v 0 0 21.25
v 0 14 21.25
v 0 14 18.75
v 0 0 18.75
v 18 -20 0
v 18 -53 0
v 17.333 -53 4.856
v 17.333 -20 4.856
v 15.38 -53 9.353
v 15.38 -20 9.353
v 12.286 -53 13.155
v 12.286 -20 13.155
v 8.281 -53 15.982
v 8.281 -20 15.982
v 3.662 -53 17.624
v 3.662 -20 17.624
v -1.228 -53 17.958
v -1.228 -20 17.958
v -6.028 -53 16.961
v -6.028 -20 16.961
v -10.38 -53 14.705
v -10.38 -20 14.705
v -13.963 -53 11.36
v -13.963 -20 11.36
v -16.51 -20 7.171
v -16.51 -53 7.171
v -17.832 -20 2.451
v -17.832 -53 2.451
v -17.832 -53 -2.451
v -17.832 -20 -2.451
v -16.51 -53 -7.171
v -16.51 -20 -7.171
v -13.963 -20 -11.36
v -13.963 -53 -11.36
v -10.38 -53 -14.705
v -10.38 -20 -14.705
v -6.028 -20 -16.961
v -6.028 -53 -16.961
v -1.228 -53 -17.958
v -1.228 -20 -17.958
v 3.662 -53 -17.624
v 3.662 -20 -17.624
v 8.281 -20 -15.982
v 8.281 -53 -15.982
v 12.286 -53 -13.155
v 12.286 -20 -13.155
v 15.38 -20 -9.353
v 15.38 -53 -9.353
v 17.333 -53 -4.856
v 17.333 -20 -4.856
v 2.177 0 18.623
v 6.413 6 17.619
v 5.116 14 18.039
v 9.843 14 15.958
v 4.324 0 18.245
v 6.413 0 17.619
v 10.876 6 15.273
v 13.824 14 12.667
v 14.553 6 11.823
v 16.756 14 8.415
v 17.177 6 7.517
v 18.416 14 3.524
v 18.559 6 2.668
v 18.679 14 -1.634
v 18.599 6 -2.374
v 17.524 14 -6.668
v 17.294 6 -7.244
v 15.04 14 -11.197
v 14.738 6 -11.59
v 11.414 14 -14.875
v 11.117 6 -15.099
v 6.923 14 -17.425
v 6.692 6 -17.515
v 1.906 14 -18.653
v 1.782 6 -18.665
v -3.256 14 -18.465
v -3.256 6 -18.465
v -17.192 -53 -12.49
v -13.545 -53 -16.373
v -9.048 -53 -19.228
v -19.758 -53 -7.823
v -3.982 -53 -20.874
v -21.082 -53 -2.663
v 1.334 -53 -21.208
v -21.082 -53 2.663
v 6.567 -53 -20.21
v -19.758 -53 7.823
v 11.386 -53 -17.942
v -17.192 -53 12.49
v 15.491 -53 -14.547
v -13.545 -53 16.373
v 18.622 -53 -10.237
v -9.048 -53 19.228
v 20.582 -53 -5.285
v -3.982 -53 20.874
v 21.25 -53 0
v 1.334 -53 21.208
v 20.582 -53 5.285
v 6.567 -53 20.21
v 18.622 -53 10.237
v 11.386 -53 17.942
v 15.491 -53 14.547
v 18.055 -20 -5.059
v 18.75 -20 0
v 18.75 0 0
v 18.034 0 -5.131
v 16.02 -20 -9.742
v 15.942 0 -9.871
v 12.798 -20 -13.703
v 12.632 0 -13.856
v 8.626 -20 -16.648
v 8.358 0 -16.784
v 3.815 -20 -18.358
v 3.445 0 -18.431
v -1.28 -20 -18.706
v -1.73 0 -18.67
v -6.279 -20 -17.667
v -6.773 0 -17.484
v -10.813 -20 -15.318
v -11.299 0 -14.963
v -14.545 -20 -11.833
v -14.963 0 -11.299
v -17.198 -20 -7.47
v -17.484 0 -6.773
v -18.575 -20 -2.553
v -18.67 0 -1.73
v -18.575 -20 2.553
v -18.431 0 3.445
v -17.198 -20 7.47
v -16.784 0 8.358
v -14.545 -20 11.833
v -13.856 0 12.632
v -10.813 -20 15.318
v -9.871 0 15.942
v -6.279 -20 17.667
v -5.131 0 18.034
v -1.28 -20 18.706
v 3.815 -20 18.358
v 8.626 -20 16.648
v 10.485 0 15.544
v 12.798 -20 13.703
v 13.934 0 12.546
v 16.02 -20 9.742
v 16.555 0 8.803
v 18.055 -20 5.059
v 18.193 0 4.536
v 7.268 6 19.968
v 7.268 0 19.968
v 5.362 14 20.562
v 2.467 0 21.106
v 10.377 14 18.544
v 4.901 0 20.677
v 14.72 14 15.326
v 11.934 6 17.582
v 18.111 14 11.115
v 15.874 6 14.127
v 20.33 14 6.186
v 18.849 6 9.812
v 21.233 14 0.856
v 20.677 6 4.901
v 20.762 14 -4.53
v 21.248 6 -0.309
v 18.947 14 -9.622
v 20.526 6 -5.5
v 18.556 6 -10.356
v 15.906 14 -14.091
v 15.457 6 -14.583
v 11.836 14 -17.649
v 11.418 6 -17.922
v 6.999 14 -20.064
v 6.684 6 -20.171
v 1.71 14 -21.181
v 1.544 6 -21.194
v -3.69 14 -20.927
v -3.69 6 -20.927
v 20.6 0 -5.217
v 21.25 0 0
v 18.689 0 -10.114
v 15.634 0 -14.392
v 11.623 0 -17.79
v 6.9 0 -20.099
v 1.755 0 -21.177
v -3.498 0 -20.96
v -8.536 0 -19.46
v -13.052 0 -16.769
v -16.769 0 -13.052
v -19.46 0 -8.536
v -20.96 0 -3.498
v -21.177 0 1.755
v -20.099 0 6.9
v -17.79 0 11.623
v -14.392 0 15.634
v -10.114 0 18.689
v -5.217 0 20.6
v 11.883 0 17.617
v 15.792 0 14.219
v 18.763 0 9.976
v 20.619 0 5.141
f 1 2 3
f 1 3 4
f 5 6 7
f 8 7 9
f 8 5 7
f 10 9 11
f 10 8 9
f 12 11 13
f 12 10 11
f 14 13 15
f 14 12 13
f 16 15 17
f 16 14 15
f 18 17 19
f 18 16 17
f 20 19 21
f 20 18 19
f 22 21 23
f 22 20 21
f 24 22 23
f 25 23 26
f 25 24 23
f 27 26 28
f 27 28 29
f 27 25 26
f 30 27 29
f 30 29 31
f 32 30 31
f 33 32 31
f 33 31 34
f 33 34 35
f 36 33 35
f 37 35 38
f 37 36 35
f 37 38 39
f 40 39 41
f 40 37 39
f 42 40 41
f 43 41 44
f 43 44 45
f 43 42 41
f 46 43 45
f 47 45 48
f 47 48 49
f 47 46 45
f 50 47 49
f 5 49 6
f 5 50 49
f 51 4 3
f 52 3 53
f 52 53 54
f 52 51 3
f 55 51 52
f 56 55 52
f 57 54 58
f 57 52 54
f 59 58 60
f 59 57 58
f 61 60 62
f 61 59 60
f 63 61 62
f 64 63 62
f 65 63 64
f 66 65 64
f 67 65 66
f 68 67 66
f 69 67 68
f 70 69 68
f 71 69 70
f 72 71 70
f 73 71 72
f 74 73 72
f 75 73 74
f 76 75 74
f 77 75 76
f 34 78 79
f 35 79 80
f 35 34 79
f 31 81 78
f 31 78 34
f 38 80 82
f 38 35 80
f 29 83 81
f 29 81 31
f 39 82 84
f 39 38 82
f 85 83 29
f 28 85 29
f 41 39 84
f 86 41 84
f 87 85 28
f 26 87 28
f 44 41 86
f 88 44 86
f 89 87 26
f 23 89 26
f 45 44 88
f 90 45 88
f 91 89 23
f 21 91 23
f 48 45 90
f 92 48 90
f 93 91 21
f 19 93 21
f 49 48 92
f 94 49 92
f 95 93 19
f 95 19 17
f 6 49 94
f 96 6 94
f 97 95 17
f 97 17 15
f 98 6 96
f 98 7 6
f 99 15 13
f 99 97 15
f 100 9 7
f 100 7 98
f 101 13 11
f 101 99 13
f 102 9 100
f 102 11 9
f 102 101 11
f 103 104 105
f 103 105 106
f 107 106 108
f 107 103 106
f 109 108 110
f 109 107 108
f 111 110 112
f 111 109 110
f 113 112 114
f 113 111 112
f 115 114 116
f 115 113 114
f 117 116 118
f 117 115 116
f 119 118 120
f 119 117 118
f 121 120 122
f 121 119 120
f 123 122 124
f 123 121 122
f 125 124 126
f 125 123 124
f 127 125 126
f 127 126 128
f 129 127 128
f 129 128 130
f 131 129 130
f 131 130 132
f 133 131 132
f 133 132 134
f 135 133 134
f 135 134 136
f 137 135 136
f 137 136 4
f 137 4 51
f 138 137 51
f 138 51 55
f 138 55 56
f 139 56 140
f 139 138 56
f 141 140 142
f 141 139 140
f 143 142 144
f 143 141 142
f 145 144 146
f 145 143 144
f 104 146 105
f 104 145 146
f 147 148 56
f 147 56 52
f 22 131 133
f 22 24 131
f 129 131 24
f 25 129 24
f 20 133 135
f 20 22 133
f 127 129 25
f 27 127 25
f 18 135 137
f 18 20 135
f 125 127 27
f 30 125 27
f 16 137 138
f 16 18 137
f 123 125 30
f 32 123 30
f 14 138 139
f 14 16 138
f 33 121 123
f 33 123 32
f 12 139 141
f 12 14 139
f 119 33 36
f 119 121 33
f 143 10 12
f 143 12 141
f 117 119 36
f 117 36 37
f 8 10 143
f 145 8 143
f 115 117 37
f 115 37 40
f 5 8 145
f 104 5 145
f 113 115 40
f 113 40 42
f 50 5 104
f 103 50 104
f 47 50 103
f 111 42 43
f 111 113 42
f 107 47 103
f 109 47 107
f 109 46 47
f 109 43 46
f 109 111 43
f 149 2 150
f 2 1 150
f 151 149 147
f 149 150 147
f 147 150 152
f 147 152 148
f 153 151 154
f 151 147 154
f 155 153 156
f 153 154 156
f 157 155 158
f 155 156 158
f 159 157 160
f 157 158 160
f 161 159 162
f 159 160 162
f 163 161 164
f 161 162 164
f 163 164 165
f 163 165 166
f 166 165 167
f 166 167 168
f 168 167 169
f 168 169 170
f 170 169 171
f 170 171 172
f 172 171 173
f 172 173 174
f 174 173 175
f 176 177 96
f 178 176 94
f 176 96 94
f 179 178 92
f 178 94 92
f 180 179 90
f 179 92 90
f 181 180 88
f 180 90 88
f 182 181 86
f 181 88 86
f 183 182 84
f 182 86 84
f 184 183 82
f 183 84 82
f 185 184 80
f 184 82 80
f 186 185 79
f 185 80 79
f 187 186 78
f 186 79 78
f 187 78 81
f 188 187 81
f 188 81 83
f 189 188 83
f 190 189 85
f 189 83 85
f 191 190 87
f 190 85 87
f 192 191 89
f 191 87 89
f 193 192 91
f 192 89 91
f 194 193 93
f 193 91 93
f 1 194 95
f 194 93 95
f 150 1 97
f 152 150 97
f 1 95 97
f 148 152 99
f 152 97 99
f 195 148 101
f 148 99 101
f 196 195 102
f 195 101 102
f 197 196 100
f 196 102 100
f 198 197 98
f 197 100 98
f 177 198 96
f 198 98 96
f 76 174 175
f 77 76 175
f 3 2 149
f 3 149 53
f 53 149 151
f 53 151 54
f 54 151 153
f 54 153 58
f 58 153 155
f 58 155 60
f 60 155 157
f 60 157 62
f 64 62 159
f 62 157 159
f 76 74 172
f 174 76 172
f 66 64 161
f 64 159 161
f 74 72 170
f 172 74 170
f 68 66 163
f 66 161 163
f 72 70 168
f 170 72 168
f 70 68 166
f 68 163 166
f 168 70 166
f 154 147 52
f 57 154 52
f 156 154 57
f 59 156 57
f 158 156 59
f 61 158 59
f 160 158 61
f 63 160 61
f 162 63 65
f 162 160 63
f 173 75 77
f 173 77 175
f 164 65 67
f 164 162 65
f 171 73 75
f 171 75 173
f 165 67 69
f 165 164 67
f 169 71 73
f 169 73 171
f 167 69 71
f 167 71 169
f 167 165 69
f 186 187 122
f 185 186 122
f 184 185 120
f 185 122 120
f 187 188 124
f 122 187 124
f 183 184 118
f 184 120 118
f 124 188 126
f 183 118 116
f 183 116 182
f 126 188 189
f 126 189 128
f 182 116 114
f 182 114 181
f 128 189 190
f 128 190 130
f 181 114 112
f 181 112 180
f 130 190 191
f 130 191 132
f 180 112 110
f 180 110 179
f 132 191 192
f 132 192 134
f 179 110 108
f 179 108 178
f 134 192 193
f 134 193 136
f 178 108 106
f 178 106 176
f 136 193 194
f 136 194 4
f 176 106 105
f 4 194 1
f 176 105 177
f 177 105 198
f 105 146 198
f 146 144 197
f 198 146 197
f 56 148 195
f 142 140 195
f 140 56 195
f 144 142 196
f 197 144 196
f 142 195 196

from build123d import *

# Parameters (mm, degrees)
F0_R        = 21.25
F0_R_2      = 18.75
F1_DEPTH    = 20
F3_R        = 21.25
F3_R_2      = 18
F4_DEPTH    = 25
F4_FACE_R   = 21.25
F4_FACE_R_2 = 18
F5_DEPTH    = 8
F7_W        = 6
F7_H        = 2.5
F8_ANGLE    = 20
F9_W        = 8
F9_H        = 2.5
F10_ANGLE   = 190


with BuildPart() as f1:
    # F0 (on Front) → F1 (new body)
    with BuildSketch(Plane.XZ):
        Circle(F0_R)
        Circle(F0_R_2, mode=Mode.SUBTRACT)
    extrude(amount=F1_DEPTH)


with BuildPart() as f4:
    # F3 (on offset) → F4 (new body)
    with BuildSketch(Plane.XZ.offset(28)):
        Circle(F3_R)
        Circle(F3_R_2, mode=Mode.SUBTRACT)
    extrude(amount=F4_DEPTH)


with BuildPart() as f5:
    # F4_face (on face) → F5 (new body, through all)
    with BuildSketch(Plane(origin=(0, -28, 0), x_dir=(1, 0, 0), z_dir=(0, 1, 0))):
        Circle(F4_FACE_R)
        Circle(F4_FACE_R_2, mode=Mode.SUBTRACT)
    extrude(amount=F5_DEPTH)


with BuildPart() as f1_1:
    add(f1.part)

    # F6: union F4, F5
    add(f4.part)
    add(f5.part)

    # F7 (on Right) → F8 (revolve)
    with BuildSketch(Plane.YZ):
        with Locations((3, 20)):
            Rectangle(F7_W, F7_H)
    revolve(axis=Axis((0, 6.62554, 0), (0, 1, 0)), revolution_arc=F8_ANGLE)

    # F9 (on face) → F10 (revolve)
    with BuildSketch(Plane(origin=(0, 0, 0), x_dir=(0, -1, 0), z_dir=(-1, 0, 0))):
        with Locations((-10, 20)):
            Rectangle(F9_W, F9_H)
    revolve(axis=Axis((0, 8.909439, 0), (0, 1, 0)), revolution_arc=F10_ANGLE)


solid = f1_1.part
